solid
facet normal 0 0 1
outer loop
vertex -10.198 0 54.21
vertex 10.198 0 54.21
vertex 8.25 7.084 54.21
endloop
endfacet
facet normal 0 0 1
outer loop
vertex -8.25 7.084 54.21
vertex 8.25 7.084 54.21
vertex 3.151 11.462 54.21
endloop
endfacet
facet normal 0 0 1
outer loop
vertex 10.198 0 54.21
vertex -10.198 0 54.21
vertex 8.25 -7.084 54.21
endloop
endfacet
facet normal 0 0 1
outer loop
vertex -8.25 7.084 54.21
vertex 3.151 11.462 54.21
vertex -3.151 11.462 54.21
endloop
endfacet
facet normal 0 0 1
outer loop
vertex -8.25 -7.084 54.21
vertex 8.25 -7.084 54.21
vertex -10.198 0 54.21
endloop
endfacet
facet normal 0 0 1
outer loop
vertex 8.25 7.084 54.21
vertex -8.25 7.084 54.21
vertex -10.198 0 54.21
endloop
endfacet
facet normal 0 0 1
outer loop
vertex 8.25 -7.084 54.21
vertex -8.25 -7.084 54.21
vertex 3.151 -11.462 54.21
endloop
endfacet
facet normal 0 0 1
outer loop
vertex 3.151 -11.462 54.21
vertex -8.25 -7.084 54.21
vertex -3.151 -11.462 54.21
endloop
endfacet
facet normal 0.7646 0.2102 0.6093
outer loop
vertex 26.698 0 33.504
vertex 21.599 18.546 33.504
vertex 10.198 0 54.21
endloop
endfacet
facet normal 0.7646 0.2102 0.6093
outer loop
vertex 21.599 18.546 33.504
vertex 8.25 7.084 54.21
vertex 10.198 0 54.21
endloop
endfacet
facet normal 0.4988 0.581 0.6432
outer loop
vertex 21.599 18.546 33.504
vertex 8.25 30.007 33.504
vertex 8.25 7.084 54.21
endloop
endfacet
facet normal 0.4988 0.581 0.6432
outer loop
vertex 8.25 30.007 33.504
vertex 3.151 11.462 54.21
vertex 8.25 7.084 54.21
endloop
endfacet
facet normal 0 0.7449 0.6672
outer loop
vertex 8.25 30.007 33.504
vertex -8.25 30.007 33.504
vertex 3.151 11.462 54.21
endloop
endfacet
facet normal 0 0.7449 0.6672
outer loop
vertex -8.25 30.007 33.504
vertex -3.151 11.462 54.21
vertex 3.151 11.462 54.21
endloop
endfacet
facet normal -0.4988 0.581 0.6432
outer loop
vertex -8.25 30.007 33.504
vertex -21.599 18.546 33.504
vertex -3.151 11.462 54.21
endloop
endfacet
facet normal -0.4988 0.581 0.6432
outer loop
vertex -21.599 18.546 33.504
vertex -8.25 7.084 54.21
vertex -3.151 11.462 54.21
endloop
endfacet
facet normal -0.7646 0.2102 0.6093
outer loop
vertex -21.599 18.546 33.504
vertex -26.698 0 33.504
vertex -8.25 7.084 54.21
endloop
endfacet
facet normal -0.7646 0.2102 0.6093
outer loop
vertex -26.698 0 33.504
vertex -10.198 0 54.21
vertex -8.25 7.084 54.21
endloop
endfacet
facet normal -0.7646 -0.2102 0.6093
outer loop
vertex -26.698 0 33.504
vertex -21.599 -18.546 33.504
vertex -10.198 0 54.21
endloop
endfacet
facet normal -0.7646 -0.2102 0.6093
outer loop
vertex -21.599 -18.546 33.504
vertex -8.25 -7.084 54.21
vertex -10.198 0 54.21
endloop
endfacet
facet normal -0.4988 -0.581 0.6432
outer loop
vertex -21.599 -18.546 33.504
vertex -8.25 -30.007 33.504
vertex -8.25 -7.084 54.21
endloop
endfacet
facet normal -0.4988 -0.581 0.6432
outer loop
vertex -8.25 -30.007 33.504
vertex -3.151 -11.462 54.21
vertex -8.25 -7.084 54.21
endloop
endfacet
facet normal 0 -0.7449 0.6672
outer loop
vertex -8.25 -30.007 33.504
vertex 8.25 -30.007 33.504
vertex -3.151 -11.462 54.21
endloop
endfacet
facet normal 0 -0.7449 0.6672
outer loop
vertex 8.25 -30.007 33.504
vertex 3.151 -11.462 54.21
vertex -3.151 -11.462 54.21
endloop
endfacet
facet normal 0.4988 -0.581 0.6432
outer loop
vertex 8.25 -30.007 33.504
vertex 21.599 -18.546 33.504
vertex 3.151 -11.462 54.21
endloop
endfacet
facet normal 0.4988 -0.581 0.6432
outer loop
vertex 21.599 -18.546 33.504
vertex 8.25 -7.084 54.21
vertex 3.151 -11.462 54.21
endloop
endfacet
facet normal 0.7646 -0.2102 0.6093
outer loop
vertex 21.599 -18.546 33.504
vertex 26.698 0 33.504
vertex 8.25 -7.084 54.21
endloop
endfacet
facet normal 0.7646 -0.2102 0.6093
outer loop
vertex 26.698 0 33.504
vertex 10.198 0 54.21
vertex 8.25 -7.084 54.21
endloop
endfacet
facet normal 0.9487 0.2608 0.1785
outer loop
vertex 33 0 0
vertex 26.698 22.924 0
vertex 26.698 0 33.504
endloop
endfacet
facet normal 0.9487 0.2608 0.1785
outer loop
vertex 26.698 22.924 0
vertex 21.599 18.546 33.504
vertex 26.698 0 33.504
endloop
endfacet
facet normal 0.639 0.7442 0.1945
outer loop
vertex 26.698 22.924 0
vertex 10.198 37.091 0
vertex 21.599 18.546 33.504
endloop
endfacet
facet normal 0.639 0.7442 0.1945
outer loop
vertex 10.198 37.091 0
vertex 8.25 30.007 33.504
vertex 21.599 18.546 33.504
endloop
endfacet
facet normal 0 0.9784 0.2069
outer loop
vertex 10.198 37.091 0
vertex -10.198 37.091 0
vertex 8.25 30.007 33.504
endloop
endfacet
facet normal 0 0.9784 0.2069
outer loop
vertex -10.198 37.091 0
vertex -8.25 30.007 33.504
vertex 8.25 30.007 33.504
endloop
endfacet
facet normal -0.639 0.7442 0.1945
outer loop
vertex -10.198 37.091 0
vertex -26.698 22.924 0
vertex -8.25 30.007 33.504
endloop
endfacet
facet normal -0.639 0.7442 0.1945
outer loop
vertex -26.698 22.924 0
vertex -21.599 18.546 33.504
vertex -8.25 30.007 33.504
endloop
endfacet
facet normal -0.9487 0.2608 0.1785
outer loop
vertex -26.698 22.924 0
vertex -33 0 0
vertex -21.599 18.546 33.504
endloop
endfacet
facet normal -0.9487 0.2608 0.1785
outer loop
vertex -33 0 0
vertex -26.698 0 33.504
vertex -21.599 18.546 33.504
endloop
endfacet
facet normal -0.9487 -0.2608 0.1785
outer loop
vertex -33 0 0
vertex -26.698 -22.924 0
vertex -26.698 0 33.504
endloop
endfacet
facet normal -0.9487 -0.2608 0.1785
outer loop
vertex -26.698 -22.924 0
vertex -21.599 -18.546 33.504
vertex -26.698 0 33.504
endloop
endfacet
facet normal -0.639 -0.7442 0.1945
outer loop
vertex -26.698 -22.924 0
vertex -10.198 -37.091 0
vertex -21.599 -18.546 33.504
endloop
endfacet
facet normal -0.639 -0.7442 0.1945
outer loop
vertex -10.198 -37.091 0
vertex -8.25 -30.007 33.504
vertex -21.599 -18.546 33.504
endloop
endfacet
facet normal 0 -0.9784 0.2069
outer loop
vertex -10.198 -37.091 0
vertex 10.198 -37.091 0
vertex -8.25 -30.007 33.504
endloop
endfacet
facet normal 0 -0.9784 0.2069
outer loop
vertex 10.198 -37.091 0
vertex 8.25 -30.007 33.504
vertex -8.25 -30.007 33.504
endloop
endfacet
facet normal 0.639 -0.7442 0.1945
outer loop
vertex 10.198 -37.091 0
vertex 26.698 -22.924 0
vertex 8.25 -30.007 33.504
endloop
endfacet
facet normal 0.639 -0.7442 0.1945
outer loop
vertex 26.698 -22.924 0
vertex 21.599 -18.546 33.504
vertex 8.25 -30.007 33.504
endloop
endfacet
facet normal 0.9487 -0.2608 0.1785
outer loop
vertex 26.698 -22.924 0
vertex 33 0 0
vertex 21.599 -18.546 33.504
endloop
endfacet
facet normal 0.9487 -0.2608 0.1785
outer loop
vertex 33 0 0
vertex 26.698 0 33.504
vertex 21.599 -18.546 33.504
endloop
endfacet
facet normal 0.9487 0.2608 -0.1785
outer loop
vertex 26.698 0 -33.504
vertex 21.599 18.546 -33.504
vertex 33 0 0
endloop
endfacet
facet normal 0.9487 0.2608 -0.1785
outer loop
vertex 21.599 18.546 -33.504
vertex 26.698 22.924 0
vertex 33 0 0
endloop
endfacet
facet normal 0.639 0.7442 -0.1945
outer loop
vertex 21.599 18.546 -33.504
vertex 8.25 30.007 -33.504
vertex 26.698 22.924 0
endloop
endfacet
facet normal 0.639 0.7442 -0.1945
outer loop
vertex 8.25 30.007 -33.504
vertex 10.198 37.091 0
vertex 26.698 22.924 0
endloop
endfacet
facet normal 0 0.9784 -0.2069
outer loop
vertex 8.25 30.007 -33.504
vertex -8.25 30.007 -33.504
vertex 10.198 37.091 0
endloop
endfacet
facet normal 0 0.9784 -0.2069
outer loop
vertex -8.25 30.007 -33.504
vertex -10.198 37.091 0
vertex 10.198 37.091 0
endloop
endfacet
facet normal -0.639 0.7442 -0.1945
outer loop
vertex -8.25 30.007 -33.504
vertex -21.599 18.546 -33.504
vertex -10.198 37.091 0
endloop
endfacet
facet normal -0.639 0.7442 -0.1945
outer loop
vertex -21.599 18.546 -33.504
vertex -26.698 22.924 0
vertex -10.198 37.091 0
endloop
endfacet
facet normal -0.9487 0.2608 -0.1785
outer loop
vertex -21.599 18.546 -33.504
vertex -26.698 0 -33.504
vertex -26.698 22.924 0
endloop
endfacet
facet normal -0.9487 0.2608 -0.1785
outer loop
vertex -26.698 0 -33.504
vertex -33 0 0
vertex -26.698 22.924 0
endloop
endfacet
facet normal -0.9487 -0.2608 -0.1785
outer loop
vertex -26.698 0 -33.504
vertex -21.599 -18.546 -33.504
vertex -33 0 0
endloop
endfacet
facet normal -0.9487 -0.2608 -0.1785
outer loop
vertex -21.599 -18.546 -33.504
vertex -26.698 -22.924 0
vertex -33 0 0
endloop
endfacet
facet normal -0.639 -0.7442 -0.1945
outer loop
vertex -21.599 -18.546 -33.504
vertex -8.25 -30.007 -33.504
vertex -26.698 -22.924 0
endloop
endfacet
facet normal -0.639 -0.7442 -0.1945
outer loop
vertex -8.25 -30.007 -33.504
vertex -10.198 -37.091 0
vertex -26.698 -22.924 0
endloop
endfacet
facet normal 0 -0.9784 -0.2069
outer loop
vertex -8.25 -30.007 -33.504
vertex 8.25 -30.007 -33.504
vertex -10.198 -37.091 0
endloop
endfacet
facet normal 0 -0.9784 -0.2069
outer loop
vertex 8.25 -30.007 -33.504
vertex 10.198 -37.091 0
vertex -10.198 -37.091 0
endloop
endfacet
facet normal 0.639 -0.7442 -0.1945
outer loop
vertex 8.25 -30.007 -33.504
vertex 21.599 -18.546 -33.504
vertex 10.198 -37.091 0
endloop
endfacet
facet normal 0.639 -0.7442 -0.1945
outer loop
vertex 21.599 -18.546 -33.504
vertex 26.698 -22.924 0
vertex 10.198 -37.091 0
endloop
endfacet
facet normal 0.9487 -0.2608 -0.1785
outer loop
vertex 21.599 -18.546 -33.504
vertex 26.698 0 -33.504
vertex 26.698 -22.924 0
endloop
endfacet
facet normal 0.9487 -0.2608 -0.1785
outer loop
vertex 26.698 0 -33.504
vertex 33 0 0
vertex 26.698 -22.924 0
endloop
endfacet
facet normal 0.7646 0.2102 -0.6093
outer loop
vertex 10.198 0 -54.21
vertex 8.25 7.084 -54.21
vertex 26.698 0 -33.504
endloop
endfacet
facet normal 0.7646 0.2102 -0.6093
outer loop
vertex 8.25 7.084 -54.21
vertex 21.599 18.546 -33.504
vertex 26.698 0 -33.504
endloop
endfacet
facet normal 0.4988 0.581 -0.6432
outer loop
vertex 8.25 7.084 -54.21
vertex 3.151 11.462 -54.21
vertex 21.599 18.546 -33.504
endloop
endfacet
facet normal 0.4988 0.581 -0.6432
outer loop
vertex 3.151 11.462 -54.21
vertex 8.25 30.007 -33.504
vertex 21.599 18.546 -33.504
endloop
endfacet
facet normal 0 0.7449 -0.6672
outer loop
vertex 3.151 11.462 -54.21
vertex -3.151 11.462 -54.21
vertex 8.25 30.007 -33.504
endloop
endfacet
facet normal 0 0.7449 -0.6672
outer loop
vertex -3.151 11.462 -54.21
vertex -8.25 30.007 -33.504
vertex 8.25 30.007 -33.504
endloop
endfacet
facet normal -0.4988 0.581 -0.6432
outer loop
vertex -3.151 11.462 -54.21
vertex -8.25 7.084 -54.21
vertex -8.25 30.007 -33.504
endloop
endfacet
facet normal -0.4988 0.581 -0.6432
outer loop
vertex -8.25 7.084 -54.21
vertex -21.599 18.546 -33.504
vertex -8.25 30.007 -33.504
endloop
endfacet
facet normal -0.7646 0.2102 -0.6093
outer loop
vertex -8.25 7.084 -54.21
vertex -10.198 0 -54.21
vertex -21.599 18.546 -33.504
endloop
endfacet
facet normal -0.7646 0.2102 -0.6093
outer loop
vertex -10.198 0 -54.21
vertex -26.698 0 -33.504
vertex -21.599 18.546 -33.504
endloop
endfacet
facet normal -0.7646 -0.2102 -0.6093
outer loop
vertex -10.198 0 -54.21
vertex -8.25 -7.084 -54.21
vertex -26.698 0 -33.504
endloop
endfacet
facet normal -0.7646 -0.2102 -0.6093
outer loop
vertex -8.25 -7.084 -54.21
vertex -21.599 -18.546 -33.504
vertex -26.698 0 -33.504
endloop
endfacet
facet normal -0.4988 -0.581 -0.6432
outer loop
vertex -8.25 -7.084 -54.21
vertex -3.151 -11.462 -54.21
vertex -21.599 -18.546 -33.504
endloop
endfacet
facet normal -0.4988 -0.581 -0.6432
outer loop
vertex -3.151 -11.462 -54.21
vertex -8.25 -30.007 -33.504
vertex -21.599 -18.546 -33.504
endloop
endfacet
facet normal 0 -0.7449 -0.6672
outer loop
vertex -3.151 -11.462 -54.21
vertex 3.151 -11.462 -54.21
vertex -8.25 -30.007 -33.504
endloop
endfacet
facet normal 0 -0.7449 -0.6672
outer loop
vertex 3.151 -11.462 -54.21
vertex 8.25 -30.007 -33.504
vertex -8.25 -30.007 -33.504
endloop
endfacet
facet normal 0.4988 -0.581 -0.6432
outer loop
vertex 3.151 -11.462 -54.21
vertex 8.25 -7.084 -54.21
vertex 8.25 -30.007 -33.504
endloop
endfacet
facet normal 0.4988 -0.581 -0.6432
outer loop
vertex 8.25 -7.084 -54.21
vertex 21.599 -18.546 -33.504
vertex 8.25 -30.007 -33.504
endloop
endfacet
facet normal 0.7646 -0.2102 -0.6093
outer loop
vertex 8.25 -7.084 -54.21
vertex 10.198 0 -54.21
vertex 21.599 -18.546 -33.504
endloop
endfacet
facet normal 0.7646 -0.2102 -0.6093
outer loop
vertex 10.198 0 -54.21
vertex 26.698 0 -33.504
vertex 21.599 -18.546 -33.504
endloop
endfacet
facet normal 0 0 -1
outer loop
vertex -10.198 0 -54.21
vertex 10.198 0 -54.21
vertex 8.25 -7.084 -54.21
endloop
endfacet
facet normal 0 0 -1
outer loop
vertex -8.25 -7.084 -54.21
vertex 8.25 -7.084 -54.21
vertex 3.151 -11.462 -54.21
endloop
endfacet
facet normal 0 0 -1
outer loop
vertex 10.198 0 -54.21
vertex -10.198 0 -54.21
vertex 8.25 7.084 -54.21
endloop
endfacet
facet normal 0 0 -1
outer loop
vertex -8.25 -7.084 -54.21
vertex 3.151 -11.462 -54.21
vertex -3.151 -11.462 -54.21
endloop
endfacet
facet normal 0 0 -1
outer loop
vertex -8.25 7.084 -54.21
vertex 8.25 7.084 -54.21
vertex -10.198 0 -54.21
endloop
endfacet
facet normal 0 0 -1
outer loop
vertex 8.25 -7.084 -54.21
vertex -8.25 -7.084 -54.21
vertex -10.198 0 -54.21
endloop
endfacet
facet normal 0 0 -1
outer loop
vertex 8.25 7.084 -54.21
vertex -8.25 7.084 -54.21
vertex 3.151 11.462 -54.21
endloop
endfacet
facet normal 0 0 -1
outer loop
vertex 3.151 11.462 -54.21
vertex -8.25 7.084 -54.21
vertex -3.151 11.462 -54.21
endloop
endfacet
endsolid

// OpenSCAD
// Generated by SolidPython 1.0.1 on 2020-07-29 00:46:49


scale(v = [11, 13, 19]) {
	sphere(r = 3);
}
/***********************************************
*********      SolidPython code:      **********
************************************************
 
# import packages: SolidPython
from solid import *
from solid.utils import *
from itertools import chain, combinations, permutations


class Resize:

    def __init__(self, scad_file):
        self.scad_file = scad_file
        #self.scad_file = import_scad(scad_file)
        # cone/cylinder param:
        self.r1 = 0
        self.r2 = 0
        self.h = 0
        # rectangular prism param:
        self.w = 0
        self.l = 0
        # ellipse param:
        self.r = 0

    # import OpenScad code (file name corresponds to shape)


    # classify shape + parameters
    def assign(self, param1, param2, param3):
        if self.scad_file == 'cone.scad':
            self.r1 = param1
            self.r2 = param2
            self.h = param3
        elif self.scad_file == 'cylinder.scad':
            self.r1 = param1
            self.r2 = param2
            self.h = param3
        elif self.scad_file == 'rectangularPrism.scad':
            self.h = param1
            self.l = param2
            self.w = param3
        else:
            self.r = param1
            self.h = param2

    # resize parameters
    def iterate(self):
        x = range(3, 20, 2)
        i = 1
        if self.scad_file == 'cone.scad':
            tempList = list(permutations(x, 2))
            for temp in tempList:
                param1 = temp[0]
                param2 = temp[1]
                filepath = 'produced_scad_files/' + 'cone' + str(param1) + '_' + str(param2) + '_' + '.scad'
                scad_render_to_file(cylinder(h=param1, r1=param2, r2=0), filepath)

        elif self.scad_file == 'cylinder.scad':
            tempList = list(permutations(x, 3))
            for temp in tempList:
                param1 = temp[0]
                param2 = temp[1]
                filepath = 'produced_scad_files/' + 'cylinder' + str(param1) + '_' + str(param2) + '_' + '.scad'
                scad_render_to_file(cylinder(h=param1, r1=param2, r2=param2), filepath)

        elif self.scad_file == 'rectangularPrism.scad':
            tempList = list(permutations(x, 3))
            for temp in tempList:
                param1 = temp[0]
                param2 = temp[1]
                param3 = temp[2]
                filepath = 'produced_scad_files/' + 'rectangularPrism' + str(param1) + '_' + str(param2) + '_' + str(
                    param3) + '.scad'
                scad_render_to_file(cube(size=(param1, param2, param3)), filepath)

        elif self.scad_file == 'ellipse.scad':
            tempList = list(permutations(x, 4))
            for temp in tempList:
                param1 = temp[0]
                param2 = temp[1]
                param3 = temp[2]
                param4 = temp[3]
                filepath = 'produced_scad_files/' + 'ellipse' + str(param1) + '_' + str(param2) + '_' + str(param3) + '_' + str(param4) + '.scad'
                scad_render_to_file(scale([param1, param2, param3])(sphere(r=param4)), filepath)

    def render_to_scadfile(self):
        scad_render_to_file(scad, 'example.scad') 
 
************************************************/
